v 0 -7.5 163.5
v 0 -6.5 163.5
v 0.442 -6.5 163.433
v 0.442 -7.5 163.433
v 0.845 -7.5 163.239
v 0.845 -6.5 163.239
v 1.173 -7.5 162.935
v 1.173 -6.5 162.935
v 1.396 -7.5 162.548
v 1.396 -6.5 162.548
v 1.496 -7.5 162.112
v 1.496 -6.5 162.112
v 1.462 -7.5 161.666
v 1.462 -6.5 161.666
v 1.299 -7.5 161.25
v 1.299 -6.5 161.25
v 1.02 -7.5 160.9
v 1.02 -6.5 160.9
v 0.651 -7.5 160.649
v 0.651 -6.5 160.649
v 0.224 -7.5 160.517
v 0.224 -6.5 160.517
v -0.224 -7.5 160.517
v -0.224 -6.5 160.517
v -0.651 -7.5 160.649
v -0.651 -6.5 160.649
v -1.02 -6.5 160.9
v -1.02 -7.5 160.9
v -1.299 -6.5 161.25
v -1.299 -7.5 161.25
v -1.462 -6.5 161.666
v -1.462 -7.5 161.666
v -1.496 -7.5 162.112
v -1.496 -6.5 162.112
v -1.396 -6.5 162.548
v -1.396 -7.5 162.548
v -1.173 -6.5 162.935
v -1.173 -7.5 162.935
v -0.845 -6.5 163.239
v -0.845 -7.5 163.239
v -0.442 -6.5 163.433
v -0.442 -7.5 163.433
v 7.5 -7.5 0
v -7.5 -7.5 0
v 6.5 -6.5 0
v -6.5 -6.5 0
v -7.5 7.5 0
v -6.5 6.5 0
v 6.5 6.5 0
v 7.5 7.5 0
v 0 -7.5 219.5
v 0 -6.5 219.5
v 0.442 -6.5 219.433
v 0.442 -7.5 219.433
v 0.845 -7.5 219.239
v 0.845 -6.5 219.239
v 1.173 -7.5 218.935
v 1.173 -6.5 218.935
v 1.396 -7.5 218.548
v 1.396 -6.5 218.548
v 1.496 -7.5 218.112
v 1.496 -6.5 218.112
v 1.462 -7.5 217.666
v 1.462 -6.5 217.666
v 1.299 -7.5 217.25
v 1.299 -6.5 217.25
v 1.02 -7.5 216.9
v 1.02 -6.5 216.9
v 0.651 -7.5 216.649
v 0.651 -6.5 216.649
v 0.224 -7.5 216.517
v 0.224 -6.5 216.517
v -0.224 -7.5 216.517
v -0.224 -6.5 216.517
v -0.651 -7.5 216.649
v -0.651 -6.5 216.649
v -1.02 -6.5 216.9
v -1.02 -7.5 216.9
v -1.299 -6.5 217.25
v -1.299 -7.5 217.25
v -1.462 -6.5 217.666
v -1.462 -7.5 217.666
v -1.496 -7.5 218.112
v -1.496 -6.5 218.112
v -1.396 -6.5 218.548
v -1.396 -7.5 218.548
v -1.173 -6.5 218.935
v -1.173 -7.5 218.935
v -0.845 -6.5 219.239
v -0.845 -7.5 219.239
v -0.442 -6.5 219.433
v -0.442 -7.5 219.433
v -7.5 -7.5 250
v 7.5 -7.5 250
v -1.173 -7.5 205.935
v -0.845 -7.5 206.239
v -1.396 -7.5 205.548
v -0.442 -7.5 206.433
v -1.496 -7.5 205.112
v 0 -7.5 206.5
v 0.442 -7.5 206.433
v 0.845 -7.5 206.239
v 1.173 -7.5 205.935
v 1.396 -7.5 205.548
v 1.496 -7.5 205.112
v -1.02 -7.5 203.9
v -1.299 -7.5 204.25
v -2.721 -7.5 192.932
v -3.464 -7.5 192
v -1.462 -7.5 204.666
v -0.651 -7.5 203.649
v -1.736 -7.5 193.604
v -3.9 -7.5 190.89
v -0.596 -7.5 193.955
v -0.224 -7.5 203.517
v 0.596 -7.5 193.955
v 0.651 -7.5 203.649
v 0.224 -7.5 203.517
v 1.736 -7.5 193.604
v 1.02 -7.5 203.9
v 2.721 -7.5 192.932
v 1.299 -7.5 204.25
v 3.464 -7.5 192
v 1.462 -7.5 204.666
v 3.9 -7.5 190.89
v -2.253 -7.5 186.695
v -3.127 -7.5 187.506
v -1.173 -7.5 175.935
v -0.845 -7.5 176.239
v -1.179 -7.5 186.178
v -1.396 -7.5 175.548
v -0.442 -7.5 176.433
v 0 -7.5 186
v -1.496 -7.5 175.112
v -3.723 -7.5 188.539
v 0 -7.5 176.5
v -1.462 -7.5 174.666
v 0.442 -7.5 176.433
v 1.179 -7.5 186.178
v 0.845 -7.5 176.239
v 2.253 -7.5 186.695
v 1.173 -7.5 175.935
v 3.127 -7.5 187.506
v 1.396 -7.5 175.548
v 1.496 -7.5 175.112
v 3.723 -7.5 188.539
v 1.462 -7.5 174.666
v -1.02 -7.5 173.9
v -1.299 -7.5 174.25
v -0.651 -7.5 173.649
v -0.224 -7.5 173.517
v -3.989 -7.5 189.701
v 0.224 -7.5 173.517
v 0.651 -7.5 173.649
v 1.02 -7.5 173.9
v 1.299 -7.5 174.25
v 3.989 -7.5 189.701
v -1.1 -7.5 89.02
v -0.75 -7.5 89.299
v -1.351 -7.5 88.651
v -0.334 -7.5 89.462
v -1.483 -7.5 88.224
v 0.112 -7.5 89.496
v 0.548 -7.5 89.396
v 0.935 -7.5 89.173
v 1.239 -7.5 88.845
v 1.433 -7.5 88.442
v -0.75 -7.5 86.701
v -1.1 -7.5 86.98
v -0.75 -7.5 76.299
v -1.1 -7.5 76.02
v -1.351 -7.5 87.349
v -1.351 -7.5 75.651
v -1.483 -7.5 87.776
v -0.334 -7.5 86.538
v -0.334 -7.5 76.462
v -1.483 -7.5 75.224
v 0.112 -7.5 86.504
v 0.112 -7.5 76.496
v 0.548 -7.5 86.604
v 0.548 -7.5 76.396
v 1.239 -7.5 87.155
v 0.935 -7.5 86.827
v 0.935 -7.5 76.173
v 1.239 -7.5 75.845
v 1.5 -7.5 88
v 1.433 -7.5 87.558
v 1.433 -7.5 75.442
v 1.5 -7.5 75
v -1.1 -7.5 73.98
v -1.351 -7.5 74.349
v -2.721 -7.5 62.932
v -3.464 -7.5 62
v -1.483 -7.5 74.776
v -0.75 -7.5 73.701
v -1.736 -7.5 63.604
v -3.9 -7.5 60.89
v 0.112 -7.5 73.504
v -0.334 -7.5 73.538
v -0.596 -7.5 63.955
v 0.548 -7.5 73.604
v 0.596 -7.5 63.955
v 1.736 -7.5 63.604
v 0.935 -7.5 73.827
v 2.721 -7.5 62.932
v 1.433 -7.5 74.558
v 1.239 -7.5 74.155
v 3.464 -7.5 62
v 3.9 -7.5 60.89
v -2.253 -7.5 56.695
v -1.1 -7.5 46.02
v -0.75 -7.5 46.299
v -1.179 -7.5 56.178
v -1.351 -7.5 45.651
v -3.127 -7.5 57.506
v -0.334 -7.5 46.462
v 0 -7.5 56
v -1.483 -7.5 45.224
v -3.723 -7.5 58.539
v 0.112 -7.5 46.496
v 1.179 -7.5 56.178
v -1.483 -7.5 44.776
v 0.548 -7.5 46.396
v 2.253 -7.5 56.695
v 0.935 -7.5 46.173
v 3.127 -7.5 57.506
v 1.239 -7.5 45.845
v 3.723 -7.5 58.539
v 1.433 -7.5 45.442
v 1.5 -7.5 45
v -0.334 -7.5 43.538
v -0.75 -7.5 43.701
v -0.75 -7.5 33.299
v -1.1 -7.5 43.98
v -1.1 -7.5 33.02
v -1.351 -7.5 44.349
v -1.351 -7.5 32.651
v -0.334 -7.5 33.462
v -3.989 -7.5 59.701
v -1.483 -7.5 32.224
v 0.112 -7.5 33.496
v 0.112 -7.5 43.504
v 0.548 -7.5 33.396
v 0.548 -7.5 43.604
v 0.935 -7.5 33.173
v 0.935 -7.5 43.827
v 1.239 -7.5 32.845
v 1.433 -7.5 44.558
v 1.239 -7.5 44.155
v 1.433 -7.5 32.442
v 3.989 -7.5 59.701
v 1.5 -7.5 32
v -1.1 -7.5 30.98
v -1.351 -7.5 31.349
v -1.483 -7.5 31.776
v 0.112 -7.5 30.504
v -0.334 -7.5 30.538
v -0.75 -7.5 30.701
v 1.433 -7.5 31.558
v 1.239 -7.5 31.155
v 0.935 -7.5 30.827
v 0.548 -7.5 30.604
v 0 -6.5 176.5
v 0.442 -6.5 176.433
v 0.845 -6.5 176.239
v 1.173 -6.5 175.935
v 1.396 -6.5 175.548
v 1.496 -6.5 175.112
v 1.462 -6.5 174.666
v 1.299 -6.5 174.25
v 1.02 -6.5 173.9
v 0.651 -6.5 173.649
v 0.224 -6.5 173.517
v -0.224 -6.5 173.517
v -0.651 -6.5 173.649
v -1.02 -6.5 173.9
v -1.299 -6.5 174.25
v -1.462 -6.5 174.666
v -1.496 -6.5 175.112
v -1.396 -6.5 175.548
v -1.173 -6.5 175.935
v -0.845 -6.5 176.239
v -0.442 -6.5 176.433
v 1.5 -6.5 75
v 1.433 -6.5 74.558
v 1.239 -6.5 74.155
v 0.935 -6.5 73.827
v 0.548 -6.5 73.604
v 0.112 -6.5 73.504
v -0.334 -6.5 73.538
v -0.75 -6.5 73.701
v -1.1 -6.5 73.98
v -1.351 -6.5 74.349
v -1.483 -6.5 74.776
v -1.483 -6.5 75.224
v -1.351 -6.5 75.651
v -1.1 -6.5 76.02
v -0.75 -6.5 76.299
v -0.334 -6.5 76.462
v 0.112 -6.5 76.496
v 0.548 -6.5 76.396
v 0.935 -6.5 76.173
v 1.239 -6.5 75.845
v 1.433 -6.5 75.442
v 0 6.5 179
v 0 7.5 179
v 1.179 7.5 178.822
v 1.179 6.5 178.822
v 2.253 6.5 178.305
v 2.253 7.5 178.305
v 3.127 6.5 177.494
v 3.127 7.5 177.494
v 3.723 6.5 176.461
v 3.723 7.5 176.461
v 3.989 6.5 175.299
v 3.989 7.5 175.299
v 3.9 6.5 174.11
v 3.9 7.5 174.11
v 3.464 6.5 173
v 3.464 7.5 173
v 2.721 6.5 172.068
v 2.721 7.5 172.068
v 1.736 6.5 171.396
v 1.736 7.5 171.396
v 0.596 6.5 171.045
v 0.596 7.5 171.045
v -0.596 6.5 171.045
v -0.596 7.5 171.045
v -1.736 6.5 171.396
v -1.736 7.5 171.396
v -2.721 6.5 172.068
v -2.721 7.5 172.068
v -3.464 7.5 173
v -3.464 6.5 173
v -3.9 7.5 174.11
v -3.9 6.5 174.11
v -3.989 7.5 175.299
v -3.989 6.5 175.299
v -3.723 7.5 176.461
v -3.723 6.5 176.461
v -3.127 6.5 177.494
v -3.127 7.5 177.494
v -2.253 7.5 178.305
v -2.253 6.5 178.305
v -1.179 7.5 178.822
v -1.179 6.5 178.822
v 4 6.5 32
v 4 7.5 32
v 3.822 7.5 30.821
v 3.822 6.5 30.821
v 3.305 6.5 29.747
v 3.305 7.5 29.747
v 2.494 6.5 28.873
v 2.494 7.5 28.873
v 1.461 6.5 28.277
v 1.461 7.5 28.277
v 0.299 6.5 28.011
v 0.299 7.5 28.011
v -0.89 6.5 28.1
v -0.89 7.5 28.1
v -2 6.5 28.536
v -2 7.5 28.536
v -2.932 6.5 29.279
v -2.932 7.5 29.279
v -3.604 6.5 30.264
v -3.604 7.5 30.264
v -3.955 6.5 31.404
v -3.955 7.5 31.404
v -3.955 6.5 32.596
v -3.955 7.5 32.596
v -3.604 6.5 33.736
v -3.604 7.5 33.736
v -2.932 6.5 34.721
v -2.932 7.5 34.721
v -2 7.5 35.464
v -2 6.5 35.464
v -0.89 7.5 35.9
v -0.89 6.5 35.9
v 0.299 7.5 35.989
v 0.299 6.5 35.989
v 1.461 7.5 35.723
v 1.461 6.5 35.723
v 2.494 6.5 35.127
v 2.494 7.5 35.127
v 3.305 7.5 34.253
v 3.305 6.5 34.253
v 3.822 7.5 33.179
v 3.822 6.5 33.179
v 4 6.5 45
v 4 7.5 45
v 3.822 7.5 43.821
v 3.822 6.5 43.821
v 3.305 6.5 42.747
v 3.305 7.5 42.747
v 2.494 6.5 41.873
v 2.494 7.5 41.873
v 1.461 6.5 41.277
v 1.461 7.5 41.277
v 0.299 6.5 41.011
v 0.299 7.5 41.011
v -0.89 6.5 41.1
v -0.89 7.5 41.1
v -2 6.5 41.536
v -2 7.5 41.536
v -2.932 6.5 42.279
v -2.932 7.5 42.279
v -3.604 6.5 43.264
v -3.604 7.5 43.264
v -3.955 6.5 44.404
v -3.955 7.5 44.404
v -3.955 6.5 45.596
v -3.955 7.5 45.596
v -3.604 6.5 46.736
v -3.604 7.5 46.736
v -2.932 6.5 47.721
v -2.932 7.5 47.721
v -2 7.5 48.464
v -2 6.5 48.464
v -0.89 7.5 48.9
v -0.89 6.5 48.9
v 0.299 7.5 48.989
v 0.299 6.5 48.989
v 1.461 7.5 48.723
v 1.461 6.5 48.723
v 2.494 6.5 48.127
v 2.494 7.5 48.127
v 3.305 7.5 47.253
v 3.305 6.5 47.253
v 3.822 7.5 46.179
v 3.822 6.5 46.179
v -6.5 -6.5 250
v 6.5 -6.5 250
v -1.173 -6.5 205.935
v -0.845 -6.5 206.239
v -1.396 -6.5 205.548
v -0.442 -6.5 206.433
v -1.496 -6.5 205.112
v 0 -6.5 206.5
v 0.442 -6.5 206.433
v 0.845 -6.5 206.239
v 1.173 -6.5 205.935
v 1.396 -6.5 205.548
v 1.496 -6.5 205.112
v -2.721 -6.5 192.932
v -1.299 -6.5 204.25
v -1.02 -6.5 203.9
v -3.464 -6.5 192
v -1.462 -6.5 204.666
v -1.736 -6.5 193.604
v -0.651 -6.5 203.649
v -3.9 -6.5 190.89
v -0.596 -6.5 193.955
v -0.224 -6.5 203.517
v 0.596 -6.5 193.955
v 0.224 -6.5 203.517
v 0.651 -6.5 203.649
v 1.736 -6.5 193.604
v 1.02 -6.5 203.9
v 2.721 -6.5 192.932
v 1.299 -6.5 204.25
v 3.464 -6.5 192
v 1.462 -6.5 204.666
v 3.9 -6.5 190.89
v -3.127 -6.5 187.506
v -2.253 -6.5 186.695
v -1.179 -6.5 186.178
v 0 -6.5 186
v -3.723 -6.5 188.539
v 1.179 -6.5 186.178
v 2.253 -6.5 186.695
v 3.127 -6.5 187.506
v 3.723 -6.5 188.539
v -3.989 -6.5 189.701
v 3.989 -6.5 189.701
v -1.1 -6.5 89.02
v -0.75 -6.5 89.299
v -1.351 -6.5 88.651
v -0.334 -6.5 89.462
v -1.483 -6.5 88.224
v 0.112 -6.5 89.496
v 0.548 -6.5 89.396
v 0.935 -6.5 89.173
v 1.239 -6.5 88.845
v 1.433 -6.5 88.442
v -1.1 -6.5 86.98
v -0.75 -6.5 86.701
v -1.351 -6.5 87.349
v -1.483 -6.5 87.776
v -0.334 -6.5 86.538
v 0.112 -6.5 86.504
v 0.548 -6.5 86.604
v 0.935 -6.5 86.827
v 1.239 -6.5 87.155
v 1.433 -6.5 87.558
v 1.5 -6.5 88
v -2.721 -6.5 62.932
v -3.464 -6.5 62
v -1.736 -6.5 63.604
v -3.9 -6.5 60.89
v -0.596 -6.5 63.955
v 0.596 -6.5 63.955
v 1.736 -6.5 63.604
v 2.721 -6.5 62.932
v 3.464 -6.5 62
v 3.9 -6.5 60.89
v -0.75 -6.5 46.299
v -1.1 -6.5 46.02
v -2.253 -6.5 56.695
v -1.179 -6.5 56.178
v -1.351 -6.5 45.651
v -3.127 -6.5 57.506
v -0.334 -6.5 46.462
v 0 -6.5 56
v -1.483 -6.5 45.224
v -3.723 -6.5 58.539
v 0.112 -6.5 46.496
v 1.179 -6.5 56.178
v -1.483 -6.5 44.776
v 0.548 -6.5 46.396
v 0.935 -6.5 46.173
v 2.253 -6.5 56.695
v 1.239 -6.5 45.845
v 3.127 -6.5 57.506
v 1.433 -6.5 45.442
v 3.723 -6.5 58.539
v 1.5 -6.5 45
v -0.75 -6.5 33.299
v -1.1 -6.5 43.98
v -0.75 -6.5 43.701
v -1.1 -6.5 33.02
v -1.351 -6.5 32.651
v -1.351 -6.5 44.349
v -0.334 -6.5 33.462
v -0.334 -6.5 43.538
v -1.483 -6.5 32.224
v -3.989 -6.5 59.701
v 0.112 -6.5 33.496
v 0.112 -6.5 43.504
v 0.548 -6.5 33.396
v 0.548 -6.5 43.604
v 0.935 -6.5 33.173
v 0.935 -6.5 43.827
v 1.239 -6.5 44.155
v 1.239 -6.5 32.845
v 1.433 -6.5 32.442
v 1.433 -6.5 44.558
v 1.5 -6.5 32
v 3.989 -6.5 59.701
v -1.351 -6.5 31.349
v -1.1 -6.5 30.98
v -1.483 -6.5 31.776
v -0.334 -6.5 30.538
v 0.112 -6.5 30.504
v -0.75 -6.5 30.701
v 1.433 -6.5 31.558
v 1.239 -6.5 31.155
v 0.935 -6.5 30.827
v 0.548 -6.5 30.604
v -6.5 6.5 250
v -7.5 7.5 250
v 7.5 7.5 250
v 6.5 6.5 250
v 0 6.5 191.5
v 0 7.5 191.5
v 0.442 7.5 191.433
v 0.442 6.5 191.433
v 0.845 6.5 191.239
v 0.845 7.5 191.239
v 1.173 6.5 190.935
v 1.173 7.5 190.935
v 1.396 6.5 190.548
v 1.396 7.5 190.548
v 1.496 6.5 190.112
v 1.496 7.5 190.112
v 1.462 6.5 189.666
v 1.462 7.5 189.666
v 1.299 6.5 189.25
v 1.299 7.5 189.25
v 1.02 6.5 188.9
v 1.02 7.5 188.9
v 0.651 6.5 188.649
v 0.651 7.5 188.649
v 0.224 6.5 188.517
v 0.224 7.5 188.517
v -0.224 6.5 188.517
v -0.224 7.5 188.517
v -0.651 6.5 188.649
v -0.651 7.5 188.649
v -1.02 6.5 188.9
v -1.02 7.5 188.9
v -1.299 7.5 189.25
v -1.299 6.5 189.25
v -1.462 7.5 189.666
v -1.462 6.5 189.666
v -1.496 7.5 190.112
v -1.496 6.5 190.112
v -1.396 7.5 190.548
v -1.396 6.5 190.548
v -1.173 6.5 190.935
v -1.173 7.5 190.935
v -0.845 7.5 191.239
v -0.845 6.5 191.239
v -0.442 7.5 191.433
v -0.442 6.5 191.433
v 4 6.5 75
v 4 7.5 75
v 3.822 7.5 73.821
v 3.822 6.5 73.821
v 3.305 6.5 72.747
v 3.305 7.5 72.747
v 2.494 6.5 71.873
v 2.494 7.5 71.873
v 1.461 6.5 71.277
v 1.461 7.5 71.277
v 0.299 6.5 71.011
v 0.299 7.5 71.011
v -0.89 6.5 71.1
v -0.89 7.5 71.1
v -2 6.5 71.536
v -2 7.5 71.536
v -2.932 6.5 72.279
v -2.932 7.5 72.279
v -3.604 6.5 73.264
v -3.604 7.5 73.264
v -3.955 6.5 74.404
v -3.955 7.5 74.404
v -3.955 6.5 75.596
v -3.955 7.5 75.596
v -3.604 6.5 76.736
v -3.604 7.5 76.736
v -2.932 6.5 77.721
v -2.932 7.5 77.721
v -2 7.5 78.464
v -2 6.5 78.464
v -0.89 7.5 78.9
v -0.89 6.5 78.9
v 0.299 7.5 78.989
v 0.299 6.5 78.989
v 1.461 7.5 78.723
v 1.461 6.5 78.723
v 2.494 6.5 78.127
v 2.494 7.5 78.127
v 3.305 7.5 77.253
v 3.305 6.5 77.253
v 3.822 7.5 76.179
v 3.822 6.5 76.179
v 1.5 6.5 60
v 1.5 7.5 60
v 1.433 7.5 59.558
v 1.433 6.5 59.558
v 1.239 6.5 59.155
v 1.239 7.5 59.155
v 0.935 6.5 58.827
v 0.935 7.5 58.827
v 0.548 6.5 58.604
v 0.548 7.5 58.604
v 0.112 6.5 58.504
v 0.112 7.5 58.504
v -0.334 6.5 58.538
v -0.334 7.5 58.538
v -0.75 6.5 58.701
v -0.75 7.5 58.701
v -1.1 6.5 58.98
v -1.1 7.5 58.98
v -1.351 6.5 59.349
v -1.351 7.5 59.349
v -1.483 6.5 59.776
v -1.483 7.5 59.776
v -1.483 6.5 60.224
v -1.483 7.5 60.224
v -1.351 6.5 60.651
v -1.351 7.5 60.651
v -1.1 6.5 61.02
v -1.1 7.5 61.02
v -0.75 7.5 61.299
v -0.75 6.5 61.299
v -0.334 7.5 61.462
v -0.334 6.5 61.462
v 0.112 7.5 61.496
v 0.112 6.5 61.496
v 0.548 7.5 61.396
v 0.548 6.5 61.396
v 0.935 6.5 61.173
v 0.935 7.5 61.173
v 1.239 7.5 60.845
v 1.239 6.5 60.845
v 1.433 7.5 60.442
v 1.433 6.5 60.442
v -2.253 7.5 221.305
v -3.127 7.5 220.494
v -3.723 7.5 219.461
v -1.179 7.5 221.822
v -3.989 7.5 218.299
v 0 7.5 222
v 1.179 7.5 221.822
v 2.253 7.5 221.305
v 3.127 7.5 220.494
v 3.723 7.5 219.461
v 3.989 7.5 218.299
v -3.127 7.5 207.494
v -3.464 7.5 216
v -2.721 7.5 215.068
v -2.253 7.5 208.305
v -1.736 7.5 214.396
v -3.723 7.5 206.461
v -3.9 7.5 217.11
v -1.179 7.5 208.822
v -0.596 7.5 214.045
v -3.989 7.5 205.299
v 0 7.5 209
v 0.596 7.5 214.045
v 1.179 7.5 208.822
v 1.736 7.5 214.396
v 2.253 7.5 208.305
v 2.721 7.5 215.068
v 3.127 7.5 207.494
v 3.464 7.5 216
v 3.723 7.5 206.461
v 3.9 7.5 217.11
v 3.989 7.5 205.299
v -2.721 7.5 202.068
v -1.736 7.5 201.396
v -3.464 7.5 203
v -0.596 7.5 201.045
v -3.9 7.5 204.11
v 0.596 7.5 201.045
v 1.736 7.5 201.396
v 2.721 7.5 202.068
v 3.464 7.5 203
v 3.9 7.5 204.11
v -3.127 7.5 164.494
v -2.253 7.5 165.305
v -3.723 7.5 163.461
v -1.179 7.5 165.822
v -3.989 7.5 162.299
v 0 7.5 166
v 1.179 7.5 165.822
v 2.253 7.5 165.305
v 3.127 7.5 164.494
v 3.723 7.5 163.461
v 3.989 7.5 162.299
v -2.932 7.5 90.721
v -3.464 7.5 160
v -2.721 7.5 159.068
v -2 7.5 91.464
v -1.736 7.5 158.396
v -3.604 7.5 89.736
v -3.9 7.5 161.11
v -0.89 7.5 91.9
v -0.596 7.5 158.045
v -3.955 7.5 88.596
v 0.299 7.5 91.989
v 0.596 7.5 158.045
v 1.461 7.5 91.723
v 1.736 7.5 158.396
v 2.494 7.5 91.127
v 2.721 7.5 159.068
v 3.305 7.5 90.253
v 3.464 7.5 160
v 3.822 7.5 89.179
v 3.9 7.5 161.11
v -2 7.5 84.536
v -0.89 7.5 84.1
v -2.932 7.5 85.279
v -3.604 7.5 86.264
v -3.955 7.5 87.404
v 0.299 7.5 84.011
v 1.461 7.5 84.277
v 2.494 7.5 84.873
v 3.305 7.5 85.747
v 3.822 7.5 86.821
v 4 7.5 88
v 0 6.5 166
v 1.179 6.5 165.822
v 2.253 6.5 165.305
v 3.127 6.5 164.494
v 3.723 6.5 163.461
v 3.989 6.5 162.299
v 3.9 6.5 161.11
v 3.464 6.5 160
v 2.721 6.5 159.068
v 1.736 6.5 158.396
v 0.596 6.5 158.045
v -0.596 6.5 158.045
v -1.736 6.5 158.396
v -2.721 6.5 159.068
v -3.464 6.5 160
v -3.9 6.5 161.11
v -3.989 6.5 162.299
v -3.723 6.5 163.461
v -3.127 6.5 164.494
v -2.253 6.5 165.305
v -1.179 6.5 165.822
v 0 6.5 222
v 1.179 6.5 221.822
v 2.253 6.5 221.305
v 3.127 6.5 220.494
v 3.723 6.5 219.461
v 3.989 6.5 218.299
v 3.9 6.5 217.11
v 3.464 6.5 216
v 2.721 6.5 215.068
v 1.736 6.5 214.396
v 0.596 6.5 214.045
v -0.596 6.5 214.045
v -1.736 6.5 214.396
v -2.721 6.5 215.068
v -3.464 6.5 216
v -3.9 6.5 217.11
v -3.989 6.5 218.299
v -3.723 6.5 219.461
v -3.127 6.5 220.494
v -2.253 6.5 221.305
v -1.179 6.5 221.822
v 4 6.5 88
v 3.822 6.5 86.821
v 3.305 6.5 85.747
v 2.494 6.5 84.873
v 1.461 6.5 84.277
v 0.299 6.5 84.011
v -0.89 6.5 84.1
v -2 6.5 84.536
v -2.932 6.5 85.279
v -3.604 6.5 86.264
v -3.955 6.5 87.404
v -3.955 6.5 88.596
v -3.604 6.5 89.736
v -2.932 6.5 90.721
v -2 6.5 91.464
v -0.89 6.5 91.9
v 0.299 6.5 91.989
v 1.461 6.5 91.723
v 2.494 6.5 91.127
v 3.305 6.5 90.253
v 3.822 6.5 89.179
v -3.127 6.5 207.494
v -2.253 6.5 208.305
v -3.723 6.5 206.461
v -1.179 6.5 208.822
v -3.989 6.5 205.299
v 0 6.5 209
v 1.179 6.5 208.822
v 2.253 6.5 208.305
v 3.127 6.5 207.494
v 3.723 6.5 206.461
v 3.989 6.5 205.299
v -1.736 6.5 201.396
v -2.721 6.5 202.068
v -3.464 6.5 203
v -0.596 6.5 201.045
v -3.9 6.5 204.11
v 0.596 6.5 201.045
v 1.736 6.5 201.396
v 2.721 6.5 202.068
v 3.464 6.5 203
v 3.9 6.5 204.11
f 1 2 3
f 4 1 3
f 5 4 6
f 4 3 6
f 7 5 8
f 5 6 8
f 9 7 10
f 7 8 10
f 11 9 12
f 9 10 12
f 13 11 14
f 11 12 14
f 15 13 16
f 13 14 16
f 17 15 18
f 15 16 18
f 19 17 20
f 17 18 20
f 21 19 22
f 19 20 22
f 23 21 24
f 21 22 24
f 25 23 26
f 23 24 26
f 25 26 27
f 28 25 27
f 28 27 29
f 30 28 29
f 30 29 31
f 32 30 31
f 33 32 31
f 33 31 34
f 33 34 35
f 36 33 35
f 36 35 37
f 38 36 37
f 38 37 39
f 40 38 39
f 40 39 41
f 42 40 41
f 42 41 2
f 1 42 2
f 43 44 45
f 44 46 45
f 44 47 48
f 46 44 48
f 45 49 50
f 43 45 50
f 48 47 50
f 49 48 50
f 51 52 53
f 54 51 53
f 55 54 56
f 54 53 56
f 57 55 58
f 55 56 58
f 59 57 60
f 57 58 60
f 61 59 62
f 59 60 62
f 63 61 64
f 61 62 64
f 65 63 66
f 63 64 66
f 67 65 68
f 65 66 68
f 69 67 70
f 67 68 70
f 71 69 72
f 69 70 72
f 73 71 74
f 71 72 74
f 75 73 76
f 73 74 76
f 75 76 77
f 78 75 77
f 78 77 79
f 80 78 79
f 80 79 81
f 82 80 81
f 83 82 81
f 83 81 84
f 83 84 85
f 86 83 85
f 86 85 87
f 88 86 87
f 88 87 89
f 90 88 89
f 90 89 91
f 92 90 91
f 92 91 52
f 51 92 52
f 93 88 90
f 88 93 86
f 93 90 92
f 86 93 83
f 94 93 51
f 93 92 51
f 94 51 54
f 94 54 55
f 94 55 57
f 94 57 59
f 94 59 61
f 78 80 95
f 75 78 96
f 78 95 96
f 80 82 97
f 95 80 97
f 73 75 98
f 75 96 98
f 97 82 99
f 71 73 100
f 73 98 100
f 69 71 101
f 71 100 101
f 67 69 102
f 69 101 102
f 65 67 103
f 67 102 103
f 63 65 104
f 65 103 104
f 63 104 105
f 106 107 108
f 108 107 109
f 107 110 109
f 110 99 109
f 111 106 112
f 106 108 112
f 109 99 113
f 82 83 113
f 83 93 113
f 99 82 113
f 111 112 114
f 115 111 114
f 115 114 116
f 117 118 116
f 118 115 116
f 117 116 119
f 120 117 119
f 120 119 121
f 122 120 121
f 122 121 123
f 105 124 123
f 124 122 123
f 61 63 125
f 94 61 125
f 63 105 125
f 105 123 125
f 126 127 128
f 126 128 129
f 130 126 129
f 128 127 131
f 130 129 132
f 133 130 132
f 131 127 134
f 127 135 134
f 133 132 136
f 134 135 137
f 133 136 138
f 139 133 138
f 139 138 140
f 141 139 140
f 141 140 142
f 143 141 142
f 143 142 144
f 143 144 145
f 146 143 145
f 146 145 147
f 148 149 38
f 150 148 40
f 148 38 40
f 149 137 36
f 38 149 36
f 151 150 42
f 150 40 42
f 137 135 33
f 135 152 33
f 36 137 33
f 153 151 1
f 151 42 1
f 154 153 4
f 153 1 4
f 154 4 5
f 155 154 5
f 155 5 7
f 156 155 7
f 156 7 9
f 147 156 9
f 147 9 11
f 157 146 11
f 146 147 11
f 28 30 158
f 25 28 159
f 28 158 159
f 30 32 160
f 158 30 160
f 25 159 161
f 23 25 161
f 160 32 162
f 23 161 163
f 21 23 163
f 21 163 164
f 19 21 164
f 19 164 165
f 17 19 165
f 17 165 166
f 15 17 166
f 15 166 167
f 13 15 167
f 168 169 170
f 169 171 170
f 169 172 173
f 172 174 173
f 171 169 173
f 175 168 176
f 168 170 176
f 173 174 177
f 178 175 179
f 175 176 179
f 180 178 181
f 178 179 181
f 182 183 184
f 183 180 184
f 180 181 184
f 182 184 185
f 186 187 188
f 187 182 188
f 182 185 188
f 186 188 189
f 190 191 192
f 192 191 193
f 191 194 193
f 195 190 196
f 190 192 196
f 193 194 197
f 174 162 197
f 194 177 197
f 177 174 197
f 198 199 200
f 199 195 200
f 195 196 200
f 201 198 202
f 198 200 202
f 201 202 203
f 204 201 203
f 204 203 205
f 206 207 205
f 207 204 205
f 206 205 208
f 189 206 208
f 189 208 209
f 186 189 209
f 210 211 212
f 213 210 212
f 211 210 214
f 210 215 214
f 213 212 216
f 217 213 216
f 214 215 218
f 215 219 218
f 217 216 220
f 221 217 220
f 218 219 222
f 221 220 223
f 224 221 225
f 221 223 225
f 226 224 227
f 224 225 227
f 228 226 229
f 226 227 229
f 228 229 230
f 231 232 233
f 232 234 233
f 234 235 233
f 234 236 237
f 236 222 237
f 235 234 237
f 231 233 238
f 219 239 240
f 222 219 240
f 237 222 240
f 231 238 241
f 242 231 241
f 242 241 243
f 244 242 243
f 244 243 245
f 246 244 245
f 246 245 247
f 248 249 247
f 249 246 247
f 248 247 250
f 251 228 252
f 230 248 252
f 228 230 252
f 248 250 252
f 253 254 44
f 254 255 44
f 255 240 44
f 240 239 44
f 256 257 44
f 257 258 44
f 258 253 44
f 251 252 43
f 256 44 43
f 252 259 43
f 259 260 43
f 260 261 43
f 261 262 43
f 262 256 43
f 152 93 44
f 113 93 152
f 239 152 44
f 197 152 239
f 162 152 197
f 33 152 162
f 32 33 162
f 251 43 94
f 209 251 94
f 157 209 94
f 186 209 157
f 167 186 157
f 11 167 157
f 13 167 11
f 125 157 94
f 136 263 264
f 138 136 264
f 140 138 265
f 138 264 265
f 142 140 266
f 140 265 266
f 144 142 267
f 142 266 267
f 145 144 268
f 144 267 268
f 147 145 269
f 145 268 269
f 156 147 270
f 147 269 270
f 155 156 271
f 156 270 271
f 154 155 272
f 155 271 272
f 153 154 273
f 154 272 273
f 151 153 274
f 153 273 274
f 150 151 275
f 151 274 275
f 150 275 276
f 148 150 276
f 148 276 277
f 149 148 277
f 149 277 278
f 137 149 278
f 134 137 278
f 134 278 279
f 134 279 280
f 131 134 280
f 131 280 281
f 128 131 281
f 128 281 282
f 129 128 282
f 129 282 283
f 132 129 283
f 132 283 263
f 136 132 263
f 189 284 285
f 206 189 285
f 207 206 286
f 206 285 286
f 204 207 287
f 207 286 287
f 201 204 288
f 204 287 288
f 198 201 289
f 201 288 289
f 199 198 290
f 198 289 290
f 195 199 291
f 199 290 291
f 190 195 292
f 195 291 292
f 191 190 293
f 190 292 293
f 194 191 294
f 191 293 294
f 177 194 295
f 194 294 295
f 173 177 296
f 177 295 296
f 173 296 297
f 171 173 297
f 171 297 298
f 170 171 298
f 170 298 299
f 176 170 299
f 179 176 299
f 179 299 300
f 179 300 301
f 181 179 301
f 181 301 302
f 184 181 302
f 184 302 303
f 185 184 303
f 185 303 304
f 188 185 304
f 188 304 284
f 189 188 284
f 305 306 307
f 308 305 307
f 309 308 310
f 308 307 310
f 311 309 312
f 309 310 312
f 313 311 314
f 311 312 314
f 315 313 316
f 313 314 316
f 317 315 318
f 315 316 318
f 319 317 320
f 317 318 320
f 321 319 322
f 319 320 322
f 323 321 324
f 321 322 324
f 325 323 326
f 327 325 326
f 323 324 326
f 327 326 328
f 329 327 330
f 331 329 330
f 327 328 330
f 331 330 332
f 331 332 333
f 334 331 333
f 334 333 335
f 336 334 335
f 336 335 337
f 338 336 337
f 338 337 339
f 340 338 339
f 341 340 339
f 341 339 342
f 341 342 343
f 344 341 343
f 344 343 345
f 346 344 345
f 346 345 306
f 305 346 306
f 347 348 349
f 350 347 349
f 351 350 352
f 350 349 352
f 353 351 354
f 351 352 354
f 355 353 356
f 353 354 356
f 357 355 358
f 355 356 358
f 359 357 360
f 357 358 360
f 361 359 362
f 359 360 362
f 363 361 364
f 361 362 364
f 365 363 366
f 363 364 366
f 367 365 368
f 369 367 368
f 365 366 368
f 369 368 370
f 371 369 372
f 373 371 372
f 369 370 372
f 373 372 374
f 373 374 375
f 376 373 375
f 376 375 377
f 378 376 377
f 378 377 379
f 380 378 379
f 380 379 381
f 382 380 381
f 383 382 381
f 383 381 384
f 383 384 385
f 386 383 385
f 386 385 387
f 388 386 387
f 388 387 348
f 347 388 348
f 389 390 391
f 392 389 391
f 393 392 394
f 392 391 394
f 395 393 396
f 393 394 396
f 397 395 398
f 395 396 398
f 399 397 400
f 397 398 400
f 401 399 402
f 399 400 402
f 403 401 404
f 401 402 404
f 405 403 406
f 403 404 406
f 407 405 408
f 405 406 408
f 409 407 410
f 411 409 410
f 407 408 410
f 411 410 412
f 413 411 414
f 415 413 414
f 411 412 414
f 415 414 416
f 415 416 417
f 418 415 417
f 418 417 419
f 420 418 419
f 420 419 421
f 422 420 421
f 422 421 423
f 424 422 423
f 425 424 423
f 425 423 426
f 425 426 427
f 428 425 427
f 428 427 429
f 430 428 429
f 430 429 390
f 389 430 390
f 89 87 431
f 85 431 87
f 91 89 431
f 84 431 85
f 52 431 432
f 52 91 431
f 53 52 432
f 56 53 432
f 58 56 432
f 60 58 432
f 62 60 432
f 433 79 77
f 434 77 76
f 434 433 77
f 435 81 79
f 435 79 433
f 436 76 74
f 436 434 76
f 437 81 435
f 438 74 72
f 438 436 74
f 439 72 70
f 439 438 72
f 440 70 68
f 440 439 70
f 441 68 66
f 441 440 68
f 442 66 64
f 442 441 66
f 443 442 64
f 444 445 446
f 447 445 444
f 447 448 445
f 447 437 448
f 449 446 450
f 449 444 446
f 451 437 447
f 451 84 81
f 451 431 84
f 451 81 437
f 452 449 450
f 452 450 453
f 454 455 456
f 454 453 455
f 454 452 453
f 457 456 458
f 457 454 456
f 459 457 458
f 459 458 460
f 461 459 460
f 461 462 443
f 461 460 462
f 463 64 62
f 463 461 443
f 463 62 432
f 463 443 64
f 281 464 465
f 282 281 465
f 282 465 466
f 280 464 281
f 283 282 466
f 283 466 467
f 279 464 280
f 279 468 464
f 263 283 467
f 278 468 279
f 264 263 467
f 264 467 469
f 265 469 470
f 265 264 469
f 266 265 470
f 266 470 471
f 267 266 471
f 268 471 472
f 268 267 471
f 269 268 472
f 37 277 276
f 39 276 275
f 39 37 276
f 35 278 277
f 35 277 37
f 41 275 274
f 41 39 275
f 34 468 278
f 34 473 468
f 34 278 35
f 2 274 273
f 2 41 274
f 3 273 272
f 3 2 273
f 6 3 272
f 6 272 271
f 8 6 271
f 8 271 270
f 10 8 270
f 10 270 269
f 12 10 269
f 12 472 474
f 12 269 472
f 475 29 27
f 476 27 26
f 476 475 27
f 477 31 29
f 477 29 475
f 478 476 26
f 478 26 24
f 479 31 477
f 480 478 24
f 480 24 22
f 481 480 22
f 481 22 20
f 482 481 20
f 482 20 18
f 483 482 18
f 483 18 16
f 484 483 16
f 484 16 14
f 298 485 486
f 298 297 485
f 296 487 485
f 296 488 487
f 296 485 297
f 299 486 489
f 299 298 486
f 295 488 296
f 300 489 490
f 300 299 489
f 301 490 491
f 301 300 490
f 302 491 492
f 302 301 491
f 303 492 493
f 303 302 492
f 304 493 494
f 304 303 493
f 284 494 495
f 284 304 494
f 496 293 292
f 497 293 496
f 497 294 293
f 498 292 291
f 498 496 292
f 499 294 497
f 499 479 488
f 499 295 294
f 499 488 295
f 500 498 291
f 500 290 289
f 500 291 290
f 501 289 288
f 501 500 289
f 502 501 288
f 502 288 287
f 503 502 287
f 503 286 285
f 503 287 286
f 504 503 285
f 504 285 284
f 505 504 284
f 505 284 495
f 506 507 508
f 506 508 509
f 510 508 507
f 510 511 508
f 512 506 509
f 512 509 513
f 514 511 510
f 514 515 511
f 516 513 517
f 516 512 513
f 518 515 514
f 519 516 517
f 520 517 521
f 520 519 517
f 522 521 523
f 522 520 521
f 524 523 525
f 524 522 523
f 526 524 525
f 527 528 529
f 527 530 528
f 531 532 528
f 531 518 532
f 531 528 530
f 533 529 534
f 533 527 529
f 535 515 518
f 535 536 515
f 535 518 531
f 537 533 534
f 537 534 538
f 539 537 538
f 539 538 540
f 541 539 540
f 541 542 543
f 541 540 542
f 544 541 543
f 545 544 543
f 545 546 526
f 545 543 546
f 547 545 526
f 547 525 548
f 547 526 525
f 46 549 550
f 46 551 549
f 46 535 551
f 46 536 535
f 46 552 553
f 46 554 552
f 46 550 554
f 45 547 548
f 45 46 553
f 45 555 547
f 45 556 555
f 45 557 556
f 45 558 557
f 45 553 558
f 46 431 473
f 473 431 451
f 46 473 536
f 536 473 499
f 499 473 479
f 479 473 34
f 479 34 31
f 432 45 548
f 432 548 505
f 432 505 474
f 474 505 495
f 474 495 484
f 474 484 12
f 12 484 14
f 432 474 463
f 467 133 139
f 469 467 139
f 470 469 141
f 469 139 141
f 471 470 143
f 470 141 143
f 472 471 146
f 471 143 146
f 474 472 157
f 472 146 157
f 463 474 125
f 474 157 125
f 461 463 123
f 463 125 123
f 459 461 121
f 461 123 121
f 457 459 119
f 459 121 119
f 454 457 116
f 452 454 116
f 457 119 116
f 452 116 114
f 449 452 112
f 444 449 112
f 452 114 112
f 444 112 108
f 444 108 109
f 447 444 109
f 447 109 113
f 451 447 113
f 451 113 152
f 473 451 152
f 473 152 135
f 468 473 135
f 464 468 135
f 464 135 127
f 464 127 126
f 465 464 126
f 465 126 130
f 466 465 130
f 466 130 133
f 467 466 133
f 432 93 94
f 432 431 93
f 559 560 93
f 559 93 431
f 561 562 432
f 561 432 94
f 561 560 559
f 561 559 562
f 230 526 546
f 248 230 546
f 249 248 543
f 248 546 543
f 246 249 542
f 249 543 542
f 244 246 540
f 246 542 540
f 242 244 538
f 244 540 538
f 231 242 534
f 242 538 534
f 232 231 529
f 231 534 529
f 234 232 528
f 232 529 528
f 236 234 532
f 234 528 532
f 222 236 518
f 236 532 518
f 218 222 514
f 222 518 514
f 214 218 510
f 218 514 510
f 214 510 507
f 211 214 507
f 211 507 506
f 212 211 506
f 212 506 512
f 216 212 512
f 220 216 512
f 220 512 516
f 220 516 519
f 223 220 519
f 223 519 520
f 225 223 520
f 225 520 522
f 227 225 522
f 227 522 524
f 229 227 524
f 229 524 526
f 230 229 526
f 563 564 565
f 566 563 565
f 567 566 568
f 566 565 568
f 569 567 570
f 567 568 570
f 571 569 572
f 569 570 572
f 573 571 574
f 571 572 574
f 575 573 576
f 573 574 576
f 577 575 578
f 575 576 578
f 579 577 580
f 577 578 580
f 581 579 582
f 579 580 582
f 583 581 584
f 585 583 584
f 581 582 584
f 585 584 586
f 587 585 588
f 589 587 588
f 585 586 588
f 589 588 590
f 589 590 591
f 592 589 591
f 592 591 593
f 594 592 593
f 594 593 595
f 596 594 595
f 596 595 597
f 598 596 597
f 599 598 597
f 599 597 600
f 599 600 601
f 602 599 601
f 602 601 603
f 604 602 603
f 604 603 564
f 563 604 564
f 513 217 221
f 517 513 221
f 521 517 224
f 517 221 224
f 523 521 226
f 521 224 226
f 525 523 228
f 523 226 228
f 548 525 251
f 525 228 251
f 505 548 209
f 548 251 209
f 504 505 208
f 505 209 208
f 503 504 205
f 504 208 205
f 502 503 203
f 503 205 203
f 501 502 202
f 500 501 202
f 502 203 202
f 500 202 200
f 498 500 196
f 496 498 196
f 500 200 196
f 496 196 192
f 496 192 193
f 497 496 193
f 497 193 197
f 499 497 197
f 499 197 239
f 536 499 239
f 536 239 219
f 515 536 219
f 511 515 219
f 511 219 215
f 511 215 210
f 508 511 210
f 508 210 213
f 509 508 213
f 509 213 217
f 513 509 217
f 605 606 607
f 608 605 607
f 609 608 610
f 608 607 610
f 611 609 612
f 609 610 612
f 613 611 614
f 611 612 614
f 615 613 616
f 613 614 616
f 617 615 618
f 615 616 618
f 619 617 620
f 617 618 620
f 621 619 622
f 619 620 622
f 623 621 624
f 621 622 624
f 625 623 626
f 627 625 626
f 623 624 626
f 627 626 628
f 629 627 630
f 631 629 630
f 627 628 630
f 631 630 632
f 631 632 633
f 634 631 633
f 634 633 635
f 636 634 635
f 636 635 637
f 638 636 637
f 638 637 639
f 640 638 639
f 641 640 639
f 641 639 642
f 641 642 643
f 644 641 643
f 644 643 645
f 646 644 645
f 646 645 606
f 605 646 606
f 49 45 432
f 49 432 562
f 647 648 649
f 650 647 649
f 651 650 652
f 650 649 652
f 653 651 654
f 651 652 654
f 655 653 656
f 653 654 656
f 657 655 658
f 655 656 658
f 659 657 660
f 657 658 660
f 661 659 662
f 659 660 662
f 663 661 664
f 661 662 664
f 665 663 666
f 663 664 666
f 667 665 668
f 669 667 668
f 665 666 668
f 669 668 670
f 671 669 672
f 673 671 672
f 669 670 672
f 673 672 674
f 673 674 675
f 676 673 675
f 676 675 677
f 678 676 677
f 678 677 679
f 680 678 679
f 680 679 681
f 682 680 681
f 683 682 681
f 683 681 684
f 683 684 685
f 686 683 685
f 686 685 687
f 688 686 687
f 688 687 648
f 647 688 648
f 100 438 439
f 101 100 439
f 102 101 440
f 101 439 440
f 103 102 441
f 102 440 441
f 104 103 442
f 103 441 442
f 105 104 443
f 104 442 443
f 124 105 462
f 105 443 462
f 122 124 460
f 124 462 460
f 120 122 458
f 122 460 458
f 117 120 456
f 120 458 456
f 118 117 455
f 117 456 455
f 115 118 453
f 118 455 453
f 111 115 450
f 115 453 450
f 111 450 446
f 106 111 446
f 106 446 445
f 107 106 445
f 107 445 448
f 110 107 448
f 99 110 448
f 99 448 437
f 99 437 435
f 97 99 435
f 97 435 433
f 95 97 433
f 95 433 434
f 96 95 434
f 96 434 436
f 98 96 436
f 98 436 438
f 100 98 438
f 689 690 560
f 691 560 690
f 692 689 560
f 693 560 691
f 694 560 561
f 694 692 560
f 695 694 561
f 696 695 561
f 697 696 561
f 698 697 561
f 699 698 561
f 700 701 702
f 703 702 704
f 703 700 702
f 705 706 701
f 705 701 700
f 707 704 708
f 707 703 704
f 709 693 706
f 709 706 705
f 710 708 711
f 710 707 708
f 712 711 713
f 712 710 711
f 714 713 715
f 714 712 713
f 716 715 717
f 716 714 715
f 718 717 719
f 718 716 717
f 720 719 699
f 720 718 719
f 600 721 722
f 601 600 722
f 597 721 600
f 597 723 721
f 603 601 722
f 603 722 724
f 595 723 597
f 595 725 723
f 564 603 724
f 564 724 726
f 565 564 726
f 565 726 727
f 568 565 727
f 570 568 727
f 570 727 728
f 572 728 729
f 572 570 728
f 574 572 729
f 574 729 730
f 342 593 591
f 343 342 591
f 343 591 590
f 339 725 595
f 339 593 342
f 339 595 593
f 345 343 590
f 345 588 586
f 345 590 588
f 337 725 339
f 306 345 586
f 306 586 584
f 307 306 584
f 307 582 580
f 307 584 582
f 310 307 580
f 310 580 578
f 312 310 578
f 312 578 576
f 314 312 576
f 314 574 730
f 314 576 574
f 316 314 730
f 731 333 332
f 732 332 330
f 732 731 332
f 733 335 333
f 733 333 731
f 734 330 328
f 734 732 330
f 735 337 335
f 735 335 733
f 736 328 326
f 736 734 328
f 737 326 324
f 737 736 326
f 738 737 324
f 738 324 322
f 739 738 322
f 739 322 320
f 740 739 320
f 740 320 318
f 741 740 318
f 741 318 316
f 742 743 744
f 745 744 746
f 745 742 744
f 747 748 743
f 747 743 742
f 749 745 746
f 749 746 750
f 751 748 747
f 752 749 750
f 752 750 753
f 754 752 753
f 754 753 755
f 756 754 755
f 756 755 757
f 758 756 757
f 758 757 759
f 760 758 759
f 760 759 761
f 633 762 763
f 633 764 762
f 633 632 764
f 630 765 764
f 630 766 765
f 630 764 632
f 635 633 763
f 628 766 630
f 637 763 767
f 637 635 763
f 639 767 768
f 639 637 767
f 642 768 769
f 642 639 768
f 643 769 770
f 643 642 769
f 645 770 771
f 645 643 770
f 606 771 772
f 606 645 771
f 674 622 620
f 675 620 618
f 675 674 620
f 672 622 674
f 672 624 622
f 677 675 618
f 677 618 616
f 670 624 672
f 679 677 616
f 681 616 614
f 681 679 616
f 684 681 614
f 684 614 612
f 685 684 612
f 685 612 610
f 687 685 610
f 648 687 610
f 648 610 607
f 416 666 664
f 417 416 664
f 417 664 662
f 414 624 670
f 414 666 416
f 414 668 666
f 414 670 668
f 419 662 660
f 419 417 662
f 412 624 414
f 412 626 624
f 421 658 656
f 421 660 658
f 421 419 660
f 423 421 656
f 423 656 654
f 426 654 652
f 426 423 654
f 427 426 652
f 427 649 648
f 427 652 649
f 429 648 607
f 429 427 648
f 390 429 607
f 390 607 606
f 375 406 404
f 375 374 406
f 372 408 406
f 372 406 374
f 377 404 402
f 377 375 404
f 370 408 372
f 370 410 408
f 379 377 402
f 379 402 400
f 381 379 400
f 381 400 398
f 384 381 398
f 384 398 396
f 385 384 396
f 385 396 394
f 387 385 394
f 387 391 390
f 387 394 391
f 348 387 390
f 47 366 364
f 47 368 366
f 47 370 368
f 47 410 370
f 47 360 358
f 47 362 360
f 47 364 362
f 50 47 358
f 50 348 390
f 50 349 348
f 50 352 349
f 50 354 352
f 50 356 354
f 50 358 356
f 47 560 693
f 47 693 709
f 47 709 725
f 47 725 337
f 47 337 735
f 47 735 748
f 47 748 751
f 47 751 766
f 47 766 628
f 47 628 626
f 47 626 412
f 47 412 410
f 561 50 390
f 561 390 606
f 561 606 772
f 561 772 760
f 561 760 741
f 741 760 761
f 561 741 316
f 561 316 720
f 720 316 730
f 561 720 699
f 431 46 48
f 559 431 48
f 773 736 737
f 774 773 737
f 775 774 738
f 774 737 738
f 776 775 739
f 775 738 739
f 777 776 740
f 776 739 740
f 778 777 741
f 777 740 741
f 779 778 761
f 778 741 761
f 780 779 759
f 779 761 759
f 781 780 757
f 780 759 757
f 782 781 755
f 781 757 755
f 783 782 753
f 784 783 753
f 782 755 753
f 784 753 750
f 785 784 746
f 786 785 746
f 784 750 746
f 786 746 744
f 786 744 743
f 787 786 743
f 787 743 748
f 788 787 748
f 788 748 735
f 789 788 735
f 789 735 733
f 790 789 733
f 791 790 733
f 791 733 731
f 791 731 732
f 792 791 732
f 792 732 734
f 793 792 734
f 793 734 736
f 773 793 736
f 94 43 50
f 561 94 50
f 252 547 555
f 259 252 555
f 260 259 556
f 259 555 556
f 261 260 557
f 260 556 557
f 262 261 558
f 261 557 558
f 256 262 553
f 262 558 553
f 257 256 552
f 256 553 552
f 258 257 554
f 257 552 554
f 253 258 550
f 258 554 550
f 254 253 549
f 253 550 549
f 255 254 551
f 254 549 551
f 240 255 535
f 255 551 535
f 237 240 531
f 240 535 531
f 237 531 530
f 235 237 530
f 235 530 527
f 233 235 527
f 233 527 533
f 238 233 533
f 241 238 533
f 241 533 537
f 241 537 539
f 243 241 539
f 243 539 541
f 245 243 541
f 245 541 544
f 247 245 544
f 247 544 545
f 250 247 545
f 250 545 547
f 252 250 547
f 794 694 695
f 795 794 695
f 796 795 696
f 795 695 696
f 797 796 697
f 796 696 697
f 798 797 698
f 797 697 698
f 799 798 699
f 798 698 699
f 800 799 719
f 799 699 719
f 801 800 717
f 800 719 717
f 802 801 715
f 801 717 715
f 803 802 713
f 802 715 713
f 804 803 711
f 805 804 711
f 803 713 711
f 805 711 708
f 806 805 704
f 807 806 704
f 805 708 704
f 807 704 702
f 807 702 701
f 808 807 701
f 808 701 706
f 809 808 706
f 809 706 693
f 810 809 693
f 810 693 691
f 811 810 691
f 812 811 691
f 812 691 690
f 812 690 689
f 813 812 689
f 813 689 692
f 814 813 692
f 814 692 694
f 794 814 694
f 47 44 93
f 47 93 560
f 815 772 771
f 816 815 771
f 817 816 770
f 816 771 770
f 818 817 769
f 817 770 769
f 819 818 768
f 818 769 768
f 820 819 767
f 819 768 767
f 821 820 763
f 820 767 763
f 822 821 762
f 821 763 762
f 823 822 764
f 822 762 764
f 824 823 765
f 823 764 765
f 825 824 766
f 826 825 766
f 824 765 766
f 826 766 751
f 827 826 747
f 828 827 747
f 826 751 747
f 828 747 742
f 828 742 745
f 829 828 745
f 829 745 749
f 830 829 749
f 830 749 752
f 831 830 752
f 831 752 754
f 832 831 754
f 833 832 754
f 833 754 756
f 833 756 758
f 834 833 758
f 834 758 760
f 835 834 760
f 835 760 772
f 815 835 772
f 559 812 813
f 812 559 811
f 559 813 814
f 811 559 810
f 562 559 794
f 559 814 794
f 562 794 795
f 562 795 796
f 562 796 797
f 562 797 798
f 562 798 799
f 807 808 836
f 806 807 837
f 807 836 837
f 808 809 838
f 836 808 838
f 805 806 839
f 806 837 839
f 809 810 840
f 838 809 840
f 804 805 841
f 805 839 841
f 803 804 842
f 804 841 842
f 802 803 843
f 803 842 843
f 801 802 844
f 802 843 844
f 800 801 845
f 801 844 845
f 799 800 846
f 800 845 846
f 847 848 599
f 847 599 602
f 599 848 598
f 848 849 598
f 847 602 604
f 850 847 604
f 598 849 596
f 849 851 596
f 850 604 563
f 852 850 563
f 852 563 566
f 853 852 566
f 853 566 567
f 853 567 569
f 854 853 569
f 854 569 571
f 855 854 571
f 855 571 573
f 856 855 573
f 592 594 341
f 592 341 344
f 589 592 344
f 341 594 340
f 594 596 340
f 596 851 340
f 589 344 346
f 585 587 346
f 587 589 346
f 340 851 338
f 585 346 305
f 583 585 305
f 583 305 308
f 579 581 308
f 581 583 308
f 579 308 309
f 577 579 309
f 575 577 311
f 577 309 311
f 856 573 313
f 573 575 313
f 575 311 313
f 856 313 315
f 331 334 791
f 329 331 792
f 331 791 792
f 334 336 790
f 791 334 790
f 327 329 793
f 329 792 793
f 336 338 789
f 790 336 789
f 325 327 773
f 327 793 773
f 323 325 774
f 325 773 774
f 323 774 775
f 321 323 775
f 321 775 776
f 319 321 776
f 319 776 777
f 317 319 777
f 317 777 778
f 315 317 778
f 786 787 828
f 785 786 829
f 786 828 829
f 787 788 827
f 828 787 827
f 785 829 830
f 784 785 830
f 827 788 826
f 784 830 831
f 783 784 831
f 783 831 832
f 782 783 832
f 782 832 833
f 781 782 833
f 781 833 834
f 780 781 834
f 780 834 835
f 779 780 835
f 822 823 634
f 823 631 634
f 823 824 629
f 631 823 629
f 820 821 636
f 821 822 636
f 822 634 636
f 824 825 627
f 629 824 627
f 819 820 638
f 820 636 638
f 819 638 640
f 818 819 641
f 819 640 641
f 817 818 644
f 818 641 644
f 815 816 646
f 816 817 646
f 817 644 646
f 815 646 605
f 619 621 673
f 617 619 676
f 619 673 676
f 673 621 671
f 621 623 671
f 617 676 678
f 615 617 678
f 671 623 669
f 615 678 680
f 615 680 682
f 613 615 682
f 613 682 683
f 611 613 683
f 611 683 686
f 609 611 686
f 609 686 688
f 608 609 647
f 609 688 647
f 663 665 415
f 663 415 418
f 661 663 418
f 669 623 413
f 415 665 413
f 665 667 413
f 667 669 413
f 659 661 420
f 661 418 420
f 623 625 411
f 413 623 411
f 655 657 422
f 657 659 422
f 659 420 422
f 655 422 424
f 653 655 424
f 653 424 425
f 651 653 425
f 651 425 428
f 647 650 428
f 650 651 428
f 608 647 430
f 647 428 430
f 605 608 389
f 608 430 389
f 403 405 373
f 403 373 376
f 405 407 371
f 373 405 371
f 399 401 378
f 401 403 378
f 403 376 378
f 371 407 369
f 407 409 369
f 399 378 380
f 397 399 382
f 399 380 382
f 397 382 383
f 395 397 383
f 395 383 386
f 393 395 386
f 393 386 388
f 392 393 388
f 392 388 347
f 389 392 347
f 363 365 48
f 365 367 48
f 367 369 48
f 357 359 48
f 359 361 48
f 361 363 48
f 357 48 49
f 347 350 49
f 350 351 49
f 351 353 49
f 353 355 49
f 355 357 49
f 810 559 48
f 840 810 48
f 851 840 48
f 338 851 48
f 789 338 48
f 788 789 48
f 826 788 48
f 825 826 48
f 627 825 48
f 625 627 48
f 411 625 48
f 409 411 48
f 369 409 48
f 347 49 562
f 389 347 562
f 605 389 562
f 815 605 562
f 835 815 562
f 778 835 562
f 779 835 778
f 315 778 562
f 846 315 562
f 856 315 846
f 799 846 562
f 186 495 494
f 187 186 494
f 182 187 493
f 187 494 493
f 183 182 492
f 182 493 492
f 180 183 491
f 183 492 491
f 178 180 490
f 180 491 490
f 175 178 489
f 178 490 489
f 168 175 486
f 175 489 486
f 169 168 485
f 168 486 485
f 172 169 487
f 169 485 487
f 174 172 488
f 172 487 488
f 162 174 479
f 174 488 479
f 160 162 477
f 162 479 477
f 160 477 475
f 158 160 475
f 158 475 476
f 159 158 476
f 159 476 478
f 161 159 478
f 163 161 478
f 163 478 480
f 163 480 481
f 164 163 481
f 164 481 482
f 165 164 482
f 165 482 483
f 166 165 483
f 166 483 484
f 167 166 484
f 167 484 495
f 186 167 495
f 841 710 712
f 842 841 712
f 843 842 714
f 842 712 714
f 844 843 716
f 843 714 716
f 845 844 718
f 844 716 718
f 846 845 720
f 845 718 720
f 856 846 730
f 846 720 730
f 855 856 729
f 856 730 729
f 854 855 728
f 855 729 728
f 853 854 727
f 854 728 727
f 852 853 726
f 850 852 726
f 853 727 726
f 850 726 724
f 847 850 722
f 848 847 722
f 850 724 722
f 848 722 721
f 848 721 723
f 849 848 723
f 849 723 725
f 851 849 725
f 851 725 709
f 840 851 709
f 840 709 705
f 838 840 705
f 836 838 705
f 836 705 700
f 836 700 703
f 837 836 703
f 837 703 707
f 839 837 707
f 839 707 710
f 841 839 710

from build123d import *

# Parameters (mm, degrees)
SKETCH_1_W          = 15
SKETCH_1_H          = 15
SKETCH_1_W_2        = 13
SKETCH_1_H_2        = 13
EXTRUDE_1_DEPTH     = 250
SKETCH_2_R          = 1.5
CUT_EXTRUDE_1_DEPTH = 250
SKETCH_3_R          = 4
CUT_EXTRUDE_2_DEPTH = 1.5
SKETCH_4_R          = 4
CUT_EXTRUDE_3_DEPTH = 1.5


with BuildPart() as part:
    # 草图1 → 凸台-拉伸1 (new body)
    with BuildSketch(Plane.XY):
        Rectangle(SKETCH_1_W, SKETCH_1_H)
        Rectangle(SKETCH_1_W_2, SKETCH_1_H_2, mode=Mode.SUBTRACT)
    extrude(amount=EXTRUDE_1_DEPTH)

    # 草图2 → 切除-拉伸1 (cut)
    with BuildSketch(Plane(origin=(0, 7.5, 0), x_dir=(1, 0, 0), z_dir=(0, 1, 0))):
        with Locations((0, -218)):
            Circle(SKETCH_2_R)
        with Locations((0, -205)):
            Circle(SKETCH_2_R)
        with Locations((0, -175)):
            Circle(SKETCH_2_R)
        with Locations((0, -162)):
            Circle(SKETCH_2_R)
        with Locations((0, -190)):
            Circle(SKETCH_2_R)
        with Locations((0, -60)):
            Circle(SKETCH_2_R)
        with Locations((0, -88)):
            Circle(SKETCH_2_R)
        with Locations((0, -75)):
            Circle(SKETCH_2_R)
        with Locations((0, -45)):
            Circle(SKETCH_2_R)
        with Locations((0, -32)):
            Circle(SKETCH_2_R)
    extrude(amount=-CUT_EXTRUDE_1_DEPTH, mode=Mode.SUBTRACT)

    # 草图3 → 切除-拉伸2 (cut)
    with BuildSketch(Plane(origin=(0, 7.5, 0), x_dir=(1, 0, 0), z_dir=(0, 1, 0))):
        with Locations((0, -218)):
            Circle(SKETCH_3_R)
        with Locations((0, -205)):
            Circle(SKETCH_3_R)
        with Locations((0, -75)):
            Circle(SKETCH_3_R)
        with Locations((0, -162)):
            Circle(SKETCH_3_R)
        with Locations((0, -175)):
            Circle(SKETCH_3_R)
        with Locations((0, -88)):
            Circle(SKETCH_3_R)
        with Locations((0, -45)):
            Circle(SKETCH_3_R)
        with Locations((0, -32)):
            Circle(SKETCH_3_R)
    extrude(amount=-CUT_EXTRUDE_2_DEPTH, mode=Mode.SUBTRACT)

    # 草图4 → 切除-拉伸3 (cut)
    with BuildSketch(Plane.XZ.offset(7.5)):
        with Locations((0, 60)):
            Circle(SKETCH_4_R)
        with Locations((0, 190)):
            Circle(SKETCH_4_R)
    extrude(amount=-CUT_EXTRUDE_3_DEPTH, mode=Mode.SUBTRACT)


solid = part.part
